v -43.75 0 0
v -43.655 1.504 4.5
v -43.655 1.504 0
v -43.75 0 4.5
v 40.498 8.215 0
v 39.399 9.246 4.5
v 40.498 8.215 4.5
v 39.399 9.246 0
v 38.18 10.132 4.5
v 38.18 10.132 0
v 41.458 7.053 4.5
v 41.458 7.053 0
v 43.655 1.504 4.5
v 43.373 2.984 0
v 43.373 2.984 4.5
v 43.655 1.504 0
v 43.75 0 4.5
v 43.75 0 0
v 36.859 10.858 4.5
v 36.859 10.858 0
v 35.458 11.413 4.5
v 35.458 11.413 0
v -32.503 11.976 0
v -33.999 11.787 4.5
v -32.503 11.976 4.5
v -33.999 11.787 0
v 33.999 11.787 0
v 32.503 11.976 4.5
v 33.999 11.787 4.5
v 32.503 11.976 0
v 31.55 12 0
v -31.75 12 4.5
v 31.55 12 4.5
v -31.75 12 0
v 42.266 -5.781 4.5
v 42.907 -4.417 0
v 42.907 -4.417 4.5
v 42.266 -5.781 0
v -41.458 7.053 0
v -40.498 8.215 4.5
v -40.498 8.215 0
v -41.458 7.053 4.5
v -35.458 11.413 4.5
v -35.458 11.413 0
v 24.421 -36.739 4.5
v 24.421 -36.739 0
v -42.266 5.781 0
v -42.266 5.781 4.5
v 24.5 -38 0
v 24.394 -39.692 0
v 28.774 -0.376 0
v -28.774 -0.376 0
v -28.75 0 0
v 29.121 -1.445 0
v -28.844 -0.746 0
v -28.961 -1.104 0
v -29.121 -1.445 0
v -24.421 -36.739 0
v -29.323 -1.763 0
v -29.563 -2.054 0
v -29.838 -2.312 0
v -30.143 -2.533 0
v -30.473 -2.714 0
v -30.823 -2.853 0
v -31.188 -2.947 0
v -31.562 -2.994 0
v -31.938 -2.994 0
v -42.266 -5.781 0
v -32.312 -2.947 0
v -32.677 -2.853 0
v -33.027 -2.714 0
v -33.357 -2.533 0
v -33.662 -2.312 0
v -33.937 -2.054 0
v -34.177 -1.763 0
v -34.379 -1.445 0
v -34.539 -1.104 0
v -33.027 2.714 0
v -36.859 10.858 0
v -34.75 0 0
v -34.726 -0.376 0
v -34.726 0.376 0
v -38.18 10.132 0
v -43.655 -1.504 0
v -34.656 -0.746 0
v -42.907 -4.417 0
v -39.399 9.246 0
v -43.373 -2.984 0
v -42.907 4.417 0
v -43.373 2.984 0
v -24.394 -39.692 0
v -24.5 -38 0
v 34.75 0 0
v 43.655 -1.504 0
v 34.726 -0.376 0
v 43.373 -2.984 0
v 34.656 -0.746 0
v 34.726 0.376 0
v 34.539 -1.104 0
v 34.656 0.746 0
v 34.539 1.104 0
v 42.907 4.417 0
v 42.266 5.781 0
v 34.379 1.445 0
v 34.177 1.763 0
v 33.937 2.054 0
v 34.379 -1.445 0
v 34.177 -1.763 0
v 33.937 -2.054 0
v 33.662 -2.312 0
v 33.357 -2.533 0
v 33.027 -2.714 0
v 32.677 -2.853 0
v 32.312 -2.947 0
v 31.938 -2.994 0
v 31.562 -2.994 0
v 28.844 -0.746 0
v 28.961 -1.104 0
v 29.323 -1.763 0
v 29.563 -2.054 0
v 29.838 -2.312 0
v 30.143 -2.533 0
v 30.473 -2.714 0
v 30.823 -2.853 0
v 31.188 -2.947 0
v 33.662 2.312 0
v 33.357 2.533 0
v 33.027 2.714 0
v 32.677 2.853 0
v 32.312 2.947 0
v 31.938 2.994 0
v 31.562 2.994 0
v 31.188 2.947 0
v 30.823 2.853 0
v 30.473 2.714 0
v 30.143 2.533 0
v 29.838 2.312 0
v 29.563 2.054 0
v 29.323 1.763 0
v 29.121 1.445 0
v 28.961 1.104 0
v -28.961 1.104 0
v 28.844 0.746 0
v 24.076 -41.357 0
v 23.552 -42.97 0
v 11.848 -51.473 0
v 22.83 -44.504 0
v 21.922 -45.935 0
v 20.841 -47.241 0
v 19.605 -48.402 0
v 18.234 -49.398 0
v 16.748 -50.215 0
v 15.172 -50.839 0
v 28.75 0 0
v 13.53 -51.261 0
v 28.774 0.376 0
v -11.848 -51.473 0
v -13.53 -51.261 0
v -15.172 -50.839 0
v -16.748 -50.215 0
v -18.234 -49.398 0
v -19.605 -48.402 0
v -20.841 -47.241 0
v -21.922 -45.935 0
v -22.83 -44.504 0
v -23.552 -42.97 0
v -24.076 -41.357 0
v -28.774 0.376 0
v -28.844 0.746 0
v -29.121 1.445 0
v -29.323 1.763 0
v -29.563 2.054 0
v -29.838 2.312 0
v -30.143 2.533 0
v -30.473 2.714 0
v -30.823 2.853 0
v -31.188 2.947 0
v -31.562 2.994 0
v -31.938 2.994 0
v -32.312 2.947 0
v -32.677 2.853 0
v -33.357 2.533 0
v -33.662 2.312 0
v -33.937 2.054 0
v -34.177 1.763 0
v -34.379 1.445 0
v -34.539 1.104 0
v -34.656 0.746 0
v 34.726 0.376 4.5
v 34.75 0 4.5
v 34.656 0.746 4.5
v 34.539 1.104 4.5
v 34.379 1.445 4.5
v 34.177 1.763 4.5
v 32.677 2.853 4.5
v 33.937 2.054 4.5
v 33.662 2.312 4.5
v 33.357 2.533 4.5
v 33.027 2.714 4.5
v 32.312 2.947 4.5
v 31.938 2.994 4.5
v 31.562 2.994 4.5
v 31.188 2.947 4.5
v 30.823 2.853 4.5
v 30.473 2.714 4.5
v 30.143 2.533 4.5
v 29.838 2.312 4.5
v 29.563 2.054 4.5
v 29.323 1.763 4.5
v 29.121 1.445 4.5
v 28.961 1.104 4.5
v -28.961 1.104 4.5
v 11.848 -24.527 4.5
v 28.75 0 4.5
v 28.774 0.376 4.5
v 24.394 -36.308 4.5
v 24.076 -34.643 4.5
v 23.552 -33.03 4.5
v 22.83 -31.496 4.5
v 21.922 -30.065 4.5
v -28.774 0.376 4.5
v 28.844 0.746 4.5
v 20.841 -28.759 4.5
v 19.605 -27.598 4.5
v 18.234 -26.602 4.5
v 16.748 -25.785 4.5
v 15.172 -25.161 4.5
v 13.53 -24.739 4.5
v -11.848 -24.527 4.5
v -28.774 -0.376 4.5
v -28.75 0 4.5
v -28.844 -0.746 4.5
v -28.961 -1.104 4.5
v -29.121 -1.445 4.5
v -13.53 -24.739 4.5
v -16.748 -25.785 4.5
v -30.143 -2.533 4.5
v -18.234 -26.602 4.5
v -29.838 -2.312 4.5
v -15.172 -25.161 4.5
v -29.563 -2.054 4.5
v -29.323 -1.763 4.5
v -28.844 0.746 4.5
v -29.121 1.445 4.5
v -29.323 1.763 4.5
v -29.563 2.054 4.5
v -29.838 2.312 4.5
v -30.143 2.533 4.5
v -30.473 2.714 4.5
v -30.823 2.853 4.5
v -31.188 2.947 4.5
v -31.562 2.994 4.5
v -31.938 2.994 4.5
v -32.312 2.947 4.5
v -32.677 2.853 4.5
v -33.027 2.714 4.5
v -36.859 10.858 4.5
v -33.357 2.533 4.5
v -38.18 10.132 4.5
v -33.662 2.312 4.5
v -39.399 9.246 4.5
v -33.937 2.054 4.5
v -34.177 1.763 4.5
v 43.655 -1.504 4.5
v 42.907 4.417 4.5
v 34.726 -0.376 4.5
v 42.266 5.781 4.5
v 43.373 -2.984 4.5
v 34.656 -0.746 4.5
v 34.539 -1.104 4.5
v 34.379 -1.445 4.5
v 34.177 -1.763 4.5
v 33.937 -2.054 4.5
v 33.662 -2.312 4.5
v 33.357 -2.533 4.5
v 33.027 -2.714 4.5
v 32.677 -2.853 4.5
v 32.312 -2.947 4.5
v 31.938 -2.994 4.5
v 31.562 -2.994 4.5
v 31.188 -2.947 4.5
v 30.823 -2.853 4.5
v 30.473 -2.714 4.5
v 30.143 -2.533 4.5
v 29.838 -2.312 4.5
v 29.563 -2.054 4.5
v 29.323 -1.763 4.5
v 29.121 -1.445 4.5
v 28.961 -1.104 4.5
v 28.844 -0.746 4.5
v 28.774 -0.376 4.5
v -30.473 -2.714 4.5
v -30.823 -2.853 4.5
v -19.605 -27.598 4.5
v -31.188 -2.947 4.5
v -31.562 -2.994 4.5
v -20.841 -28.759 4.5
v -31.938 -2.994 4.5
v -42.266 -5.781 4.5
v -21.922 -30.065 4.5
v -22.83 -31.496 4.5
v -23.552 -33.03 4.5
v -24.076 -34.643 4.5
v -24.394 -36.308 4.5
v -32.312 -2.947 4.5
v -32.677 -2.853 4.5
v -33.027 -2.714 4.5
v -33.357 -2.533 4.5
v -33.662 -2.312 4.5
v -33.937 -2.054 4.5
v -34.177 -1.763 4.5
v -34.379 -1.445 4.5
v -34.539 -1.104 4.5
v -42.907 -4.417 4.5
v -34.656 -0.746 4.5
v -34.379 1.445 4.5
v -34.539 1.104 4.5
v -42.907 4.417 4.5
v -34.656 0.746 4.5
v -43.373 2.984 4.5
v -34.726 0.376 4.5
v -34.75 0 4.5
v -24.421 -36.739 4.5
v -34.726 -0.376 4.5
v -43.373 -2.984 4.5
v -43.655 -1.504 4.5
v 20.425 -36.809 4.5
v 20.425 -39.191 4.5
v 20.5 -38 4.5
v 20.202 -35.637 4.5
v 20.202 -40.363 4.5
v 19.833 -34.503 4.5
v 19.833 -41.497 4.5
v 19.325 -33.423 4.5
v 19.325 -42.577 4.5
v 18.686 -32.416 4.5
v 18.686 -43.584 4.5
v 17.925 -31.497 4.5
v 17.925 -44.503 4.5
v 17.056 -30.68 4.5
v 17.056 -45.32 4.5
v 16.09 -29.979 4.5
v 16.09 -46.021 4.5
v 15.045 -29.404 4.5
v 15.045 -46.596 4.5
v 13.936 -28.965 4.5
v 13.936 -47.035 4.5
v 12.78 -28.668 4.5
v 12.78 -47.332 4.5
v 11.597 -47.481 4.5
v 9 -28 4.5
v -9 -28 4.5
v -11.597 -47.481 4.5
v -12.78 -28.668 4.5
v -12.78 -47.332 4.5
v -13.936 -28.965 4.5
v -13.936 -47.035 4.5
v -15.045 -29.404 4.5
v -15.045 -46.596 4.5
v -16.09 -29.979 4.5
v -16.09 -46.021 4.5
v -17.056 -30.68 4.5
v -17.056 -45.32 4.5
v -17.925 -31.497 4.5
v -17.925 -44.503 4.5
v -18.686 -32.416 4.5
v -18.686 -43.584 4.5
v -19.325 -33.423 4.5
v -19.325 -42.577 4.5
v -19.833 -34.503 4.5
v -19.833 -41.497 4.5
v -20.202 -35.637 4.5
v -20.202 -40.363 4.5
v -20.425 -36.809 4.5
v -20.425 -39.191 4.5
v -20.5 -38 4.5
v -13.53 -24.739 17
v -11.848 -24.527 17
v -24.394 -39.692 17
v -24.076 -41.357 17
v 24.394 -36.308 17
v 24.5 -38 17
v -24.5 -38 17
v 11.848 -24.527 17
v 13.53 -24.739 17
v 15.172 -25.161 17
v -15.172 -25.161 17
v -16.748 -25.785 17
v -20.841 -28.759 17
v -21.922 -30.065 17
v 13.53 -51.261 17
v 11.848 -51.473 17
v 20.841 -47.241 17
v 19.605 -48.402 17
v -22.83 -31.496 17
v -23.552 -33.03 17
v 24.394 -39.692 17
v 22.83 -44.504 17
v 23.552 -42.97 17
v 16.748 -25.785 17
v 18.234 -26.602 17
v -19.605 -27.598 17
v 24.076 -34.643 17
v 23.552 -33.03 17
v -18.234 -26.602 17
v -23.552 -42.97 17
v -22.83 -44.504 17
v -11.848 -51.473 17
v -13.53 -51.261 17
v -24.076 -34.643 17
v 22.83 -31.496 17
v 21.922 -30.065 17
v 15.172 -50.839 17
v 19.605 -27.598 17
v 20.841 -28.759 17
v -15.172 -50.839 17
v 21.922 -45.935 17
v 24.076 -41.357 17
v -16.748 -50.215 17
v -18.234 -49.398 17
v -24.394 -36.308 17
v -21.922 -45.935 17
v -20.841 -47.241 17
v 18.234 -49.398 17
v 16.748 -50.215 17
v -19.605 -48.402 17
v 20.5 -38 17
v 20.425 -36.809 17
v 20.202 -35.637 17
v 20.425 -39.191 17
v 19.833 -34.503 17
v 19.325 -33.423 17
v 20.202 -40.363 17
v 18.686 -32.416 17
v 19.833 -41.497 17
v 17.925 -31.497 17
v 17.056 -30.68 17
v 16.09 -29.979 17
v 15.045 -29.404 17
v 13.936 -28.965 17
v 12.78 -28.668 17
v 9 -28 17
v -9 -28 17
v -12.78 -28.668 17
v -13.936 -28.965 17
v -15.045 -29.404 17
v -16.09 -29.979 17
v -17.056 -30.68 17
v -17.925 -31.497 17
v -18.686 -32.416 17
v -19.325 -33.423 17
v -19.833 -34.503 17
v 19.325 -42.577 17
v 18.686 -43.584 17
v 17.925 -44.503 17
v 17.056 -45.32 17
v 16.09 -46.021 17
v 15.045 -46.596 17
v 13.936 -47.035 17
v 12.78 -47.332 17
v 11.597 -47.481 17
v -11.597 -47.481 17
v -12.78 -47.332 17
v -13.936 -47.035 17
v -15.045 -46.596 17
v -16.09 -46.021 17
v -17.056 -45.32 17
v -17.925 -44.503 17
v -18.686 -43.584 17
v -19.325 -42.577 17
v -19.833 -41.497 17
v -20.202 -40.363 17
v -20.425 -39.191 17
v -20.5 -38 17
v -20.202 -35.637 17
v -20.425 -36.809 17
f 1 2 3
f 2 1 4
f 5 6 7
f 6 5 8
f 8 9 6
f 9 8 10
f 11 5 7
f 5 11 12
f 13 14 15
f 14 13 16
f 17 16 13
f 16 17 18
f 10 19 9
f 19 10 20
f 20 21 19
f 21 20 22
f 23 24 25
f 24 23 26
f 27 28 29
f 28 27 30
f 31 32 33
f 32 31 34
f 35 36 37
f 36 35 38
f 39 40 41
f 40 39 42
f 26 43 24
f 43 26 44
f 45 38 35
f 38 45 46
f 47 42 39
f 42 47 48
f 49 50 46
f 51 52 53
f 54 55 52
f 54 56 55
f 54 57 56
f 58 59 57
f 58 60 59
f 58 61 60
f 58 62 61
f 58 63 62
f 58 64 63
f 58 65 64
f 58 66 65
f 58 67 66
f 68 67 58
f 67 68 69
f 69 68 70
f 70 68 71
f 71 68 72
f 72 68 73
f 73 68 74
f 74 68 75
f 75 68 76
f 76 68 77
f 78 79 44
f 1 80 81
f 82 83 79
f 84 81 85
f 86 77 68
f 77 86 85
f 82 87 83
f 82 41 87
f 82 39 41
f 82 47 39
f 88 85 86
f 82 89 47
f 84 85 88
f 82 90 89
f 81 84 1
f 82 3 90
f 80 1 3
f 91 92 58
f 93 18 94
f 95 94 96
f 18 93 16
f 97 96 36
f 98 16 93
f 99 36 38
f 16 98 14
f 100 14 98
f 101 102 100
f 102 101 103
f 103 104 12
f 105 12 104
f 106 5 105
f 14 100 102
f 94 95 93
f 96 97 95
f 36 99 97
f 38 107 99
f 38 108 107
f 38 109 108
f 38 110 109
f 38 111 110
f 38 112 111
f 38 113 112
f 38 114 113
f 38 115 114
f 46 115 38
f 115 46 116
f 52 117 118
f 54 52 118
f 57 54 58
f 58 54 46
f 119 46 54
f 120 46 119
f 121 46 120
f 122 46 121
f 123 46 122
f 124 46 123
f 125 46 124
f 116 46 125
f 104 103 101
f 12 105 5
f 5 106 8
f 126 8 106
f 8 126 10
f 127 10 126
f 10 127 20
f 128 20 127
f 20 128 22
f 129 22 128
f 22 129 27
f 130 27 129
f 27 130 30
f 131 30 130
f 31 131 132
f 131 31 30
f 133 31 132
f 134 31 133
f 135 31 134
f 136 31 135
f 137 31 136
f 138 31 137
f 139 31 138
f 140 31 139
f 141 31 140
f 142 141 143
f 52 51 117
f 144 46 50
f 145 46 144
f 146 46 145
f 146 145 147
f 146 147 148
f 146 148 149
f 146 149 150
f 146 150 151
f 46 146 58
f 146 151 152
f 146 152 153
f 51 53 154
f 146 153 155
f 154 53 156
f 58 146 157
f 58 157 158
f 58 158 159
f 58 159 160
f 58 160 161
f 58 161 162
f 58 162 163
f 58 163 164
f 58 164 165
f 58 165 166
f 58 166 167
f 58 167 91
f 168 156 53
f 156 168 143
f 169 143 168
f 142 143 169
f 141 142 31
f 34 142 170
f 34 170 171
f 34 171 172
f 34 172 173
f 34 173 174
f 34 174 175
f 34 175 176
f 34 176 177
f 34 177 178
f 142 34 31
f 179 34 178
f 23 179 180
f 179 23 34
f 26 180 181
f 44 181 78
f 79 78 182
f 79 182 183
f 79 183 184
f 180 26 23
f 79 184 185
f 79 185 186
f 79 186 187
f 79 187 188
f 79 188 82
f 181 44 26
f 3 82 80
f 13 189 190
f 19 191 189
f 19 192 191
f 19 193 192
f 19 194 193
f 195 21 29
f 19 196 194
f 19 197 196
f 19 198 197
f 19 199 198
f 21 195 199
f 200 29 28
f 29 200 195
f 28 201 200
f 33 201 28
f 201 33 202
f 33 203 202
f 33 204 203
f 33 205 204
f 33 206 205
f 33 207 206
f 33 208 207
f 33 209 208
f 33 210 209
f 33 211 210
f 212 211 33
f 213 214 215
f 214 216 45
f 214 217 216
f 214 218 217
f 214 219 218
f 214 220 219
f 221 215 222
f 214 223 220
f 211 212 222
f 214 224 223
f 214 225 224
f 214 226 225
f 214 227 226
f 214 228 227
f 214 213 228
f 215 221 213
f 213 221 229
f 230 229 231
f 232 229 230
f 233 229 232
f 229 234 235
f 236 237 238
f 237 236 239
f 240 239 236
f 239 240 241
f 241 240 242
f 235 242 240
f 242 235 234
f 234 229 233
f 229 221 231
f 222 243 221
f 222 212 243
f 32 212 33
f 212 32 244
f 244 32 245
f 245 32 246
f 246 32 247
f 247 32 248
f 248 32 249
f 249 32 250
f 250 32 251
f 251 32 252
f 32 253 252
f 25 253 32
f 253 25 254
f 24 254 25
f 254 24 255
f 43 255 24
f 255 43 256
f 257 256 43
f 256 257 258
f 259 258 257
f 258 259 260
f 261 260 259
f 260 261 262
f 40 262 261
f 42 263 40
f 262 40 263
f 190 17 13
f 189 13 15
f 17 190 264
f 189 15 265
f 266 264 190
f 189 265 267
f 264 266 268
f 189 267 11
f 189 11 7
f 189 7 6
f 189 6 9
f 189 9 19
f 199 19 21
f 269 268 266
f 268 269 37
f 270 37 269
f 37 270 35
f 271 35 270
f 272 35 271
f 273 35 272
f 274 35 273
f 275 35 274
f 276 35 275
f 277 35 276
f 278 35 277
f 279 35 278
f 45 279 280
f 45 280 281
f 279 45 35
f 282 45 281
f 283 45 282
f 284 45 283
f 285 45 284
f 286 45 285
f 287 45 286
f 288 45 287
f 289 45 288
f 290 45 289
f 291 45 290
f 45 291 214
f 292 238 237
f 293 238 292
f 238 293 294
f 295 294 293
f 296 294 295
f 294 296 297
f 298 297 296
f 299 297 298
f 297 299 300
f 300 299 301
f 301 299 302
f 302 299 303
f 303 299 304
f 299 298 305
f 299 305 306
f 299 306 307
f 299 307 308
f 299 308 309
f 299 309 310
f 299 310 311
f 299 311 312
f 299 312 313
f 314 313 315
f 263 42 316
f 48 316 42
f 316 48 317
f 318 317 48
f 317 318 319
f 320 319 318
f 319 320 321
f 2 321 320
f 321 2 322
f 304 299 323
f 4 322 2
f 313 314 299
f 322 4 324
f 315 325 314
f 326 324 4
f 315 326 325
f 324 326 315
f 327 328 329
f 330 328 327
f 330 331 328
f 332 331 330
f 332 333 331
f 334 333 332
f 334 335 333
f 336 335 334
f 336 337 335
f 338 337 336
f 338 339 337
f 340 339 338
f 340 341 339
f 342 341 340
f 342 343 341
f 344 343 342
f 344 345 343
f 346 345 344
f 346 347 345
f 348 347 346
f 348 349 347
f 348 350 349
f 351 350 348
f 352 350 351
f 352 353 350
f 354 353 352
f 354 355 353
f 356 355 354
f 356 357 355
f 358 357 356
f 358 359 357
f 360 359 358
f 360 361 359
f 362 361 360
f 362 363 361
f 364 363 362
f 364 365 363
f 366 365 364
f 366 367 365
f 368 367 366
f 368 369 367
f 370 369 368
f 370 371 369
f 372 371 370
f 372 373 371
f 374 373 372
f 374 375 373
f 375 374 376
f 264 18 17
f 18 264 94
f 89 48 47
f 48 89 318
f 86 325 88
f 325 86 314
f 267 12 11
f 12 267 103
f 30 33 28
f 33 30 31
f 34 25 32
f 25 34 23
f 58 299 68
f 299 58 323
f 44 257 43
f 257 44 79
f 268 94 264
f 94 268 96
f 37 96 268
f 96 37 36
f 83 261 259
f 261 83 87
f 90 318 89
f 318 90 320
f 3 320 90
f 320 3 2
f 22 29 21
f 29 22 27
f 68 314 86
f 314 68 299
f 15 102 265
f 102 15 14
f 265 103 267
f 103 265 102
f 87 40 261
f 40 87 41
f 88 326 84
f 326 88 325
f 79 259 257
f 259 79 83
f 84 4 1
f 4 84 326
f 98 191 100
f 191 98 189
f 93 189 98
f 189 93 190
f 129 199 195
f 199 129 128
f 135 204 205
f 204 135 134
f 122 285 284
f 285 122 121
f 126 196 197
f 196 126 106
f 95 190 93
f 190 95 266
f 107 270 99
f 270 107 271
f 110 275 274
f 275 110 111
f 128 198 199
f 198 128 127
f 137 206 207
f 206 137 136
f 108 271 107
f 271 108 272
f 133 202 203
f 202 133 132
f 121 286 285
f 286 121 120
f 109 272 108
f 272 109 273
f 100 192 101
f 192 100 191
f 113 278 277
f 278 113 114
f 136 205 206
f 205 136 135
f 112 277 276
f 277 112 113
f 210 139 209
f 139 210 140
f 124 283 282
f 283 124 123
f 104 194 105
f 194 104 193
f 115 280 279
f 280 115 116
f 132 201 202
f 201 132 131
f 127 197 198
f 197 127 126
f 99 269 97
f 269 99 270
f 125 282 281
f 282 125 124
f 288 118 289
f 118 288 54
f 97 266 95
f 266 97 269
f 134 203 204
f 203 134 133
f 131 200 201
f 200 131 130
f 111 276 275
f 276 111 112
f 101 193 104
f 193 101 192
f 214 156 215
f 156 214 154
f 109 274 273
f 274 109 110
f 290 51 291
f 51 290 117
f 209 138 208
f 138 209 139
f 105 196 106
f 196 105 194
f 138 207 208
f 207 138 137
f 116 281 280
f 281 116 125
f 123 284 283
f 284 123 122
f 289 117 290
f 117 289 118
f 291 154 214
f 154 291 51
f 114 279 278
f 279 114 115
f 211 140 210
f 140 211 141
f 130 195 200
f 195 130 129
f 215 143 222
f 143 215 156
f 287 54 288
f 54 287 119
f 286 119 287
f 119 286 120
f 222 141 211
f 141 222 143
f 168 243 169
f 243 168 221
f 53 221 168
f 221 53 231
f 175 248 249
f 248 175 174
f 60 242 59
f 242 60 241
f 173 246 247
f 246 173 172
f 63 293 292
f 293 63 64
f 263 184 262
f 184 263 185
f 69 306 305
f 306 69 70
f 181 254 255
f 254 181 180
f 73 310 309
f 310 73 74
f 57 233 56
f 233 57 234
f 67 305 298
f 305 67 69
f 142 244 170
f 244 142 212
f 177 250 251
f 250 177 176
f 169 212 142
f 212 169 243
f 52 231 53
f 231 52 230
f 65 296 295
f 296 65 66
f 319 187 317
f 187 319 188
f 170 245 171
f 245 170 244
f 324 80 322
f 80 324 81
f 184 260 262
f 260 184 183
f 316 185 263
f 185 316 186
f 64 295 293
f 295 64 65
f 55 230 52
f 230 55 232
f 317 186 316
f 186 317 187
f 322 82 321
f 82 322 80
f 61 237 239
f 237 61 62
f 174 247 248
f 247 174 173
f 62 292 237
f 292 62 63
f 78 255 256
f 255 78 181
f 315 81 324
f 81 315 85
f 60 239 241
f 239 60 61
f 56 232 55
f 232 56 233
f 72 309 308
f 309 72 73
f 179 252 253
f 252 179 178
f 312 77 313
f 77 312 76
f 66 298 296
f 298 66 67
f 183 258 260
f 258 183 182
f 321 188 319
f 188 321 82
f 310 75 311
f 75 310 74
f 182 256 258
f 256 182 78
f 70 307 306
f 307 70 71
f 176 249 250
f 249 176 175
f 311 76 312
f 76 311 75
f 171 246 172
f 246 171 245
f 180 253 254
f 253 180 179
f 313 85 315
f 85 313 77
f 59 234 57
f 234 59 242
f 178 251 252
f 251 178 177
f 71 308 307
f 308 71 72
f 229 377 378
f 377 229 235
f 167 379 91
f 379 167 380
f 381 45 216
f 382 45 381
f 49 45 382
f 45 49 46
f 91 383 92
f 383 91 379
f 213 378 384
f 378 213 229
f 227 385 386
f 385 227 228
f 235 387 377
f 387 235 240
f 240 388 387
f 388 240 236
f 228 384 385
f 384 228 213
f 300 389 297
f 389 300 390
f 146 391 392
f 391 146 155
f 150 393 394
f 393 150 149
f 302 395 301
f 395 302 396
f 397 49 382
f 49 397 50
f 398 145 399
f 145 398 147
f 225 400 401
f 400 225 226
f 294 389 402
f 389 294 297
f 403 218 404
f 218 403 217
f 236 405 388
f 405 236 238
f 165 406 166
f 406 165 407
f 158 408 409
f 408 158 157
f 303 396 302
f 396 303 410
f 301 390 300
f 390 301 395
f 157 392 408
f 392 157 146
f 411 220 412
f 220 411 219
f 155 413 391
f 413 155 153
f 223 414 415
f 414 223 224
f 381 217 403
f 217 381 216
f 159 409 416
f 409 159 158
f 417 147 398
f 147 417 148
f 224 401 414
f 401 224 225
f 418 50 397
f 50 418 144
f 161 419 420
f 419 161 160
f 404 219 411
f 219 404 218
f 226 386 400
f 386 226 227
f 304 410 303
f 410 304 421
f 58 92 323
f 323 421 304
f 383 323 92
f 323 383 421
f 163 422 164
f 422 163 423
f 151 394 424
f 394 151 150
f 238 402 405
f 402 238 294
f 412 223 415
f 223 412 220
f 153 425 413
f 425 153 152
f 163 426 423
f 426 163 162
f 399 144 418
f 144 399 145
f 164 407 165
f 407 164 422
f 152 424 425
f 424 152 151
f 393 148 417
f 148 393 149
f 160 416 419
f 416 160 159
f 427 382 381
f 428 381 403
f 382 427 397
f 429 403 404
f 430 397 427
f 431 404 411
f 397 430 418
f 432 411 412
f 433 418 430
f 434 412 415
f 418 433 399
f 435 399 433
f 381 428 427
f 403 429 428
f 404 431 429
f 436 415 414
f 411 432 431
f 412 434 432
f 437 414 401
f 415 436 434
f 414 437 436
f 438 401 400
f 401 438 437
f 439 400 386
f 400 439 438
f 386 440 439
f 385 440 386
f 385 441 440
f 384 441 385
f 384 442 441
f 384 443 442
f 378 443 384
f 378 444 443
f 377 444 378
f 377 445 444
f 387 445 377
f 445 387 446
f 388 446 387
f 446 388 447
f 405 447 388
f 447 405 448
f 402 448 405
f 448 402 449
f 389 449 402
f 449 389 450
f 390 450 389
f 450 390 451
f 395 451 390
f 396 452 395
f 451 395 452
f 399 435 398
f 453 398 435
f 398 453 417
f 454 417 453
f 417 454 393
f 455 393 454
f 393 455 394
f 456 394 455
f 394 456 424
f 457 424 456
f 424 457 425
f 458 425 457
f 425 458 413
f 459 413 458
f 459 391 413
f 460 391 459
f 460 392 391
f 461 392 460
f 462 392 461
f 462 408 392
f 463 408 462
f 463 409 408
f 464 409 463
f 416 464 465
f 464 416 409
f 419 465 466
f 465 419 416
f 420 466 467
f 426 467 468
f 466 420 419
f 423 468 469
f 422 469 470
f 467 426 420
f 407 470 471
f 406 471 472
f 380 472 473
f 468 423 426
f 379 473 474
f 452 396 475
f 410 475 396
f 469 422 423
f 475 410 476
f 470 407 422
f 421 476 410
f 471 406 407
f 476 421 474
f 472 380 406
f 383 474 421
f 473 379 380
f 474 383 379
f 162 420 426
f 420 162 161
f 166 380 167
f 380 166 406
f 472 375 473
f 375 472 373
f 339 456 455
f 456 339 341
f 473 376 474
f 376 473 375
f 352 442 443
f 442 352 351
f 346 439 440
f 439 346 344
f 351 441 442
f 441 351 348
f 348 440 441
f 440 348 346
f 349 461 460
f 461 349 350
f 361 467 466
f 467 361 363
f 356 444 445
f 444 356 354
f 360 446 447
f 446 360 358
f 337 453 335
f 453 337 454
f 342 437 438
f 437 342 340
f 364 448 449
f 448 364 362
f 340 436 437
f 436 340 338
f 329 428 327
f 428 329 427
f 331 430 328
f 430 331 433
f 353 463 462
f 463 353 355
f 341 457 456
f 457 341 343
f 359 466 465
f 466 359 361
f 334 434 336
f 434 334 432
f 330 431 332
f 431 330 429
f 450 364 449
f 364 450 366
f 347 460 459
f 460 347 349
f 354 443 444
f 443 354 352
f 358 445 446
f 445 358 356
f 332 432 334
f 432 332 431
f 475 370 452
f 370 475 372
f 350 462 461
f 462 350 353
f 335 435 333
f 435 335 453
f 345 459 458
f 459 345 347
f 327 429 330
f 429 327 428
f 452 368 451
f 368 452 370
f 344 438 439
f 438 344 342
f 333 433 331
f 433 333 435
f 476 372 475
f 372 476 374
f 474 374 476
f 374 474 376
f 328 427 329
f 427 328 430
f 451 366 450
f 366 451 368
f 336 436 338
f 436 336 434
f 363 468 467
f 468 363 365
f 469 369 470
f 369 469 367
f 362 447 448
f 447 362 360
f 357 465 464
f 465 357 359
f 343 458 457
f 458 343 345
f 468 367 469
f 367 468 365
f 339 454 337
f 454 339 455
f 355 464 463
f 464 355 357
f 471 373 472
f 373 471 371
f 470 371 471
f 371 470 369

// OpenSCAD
// Komplement 12571
$fn = 50;
difference() {
difference() {
linear_extrude(height=4.5, convexity = 0, twist = 0) {
hull() {
translate([-31.75,-12,0])
square(size=[63.3,24]);
translate([31.75,0,0])
circle(d=24);
translate([-31.75,0,0])
circle(d=24);

translate([-9,-38-11,0])
square(size=[40-22,22]);
translate([11,-38,0])
circle(d=22);
translate([-11,-38,0])
circle(d=22);
}
}
translate([31.75,0,0])
cylinder(d=6,h=5);
}
translate([-31.75,0,0])
cylinder(d=6,h=5);

}
difference() {
linear_extrude(height=17, convexity = 0, twist = 0) {
 hull() {
translate([-9,-38-11,0])
square(size=[40-22,22]);
translate([11,-38,0])
circle(d=27);
translate([-11,-38,0])
circle(d=27);
}
}
translate([0,0,3])
linear_extrude(height=14, convexity = 0, twist = 0) {
  hull() {
translate([-9,-38-9,0])
square(size=[40-22,19]);
translate([11,-38,0])
circle(d=19);
translate([-11,-38,0])
circle(d=19);
  }
      }
}
